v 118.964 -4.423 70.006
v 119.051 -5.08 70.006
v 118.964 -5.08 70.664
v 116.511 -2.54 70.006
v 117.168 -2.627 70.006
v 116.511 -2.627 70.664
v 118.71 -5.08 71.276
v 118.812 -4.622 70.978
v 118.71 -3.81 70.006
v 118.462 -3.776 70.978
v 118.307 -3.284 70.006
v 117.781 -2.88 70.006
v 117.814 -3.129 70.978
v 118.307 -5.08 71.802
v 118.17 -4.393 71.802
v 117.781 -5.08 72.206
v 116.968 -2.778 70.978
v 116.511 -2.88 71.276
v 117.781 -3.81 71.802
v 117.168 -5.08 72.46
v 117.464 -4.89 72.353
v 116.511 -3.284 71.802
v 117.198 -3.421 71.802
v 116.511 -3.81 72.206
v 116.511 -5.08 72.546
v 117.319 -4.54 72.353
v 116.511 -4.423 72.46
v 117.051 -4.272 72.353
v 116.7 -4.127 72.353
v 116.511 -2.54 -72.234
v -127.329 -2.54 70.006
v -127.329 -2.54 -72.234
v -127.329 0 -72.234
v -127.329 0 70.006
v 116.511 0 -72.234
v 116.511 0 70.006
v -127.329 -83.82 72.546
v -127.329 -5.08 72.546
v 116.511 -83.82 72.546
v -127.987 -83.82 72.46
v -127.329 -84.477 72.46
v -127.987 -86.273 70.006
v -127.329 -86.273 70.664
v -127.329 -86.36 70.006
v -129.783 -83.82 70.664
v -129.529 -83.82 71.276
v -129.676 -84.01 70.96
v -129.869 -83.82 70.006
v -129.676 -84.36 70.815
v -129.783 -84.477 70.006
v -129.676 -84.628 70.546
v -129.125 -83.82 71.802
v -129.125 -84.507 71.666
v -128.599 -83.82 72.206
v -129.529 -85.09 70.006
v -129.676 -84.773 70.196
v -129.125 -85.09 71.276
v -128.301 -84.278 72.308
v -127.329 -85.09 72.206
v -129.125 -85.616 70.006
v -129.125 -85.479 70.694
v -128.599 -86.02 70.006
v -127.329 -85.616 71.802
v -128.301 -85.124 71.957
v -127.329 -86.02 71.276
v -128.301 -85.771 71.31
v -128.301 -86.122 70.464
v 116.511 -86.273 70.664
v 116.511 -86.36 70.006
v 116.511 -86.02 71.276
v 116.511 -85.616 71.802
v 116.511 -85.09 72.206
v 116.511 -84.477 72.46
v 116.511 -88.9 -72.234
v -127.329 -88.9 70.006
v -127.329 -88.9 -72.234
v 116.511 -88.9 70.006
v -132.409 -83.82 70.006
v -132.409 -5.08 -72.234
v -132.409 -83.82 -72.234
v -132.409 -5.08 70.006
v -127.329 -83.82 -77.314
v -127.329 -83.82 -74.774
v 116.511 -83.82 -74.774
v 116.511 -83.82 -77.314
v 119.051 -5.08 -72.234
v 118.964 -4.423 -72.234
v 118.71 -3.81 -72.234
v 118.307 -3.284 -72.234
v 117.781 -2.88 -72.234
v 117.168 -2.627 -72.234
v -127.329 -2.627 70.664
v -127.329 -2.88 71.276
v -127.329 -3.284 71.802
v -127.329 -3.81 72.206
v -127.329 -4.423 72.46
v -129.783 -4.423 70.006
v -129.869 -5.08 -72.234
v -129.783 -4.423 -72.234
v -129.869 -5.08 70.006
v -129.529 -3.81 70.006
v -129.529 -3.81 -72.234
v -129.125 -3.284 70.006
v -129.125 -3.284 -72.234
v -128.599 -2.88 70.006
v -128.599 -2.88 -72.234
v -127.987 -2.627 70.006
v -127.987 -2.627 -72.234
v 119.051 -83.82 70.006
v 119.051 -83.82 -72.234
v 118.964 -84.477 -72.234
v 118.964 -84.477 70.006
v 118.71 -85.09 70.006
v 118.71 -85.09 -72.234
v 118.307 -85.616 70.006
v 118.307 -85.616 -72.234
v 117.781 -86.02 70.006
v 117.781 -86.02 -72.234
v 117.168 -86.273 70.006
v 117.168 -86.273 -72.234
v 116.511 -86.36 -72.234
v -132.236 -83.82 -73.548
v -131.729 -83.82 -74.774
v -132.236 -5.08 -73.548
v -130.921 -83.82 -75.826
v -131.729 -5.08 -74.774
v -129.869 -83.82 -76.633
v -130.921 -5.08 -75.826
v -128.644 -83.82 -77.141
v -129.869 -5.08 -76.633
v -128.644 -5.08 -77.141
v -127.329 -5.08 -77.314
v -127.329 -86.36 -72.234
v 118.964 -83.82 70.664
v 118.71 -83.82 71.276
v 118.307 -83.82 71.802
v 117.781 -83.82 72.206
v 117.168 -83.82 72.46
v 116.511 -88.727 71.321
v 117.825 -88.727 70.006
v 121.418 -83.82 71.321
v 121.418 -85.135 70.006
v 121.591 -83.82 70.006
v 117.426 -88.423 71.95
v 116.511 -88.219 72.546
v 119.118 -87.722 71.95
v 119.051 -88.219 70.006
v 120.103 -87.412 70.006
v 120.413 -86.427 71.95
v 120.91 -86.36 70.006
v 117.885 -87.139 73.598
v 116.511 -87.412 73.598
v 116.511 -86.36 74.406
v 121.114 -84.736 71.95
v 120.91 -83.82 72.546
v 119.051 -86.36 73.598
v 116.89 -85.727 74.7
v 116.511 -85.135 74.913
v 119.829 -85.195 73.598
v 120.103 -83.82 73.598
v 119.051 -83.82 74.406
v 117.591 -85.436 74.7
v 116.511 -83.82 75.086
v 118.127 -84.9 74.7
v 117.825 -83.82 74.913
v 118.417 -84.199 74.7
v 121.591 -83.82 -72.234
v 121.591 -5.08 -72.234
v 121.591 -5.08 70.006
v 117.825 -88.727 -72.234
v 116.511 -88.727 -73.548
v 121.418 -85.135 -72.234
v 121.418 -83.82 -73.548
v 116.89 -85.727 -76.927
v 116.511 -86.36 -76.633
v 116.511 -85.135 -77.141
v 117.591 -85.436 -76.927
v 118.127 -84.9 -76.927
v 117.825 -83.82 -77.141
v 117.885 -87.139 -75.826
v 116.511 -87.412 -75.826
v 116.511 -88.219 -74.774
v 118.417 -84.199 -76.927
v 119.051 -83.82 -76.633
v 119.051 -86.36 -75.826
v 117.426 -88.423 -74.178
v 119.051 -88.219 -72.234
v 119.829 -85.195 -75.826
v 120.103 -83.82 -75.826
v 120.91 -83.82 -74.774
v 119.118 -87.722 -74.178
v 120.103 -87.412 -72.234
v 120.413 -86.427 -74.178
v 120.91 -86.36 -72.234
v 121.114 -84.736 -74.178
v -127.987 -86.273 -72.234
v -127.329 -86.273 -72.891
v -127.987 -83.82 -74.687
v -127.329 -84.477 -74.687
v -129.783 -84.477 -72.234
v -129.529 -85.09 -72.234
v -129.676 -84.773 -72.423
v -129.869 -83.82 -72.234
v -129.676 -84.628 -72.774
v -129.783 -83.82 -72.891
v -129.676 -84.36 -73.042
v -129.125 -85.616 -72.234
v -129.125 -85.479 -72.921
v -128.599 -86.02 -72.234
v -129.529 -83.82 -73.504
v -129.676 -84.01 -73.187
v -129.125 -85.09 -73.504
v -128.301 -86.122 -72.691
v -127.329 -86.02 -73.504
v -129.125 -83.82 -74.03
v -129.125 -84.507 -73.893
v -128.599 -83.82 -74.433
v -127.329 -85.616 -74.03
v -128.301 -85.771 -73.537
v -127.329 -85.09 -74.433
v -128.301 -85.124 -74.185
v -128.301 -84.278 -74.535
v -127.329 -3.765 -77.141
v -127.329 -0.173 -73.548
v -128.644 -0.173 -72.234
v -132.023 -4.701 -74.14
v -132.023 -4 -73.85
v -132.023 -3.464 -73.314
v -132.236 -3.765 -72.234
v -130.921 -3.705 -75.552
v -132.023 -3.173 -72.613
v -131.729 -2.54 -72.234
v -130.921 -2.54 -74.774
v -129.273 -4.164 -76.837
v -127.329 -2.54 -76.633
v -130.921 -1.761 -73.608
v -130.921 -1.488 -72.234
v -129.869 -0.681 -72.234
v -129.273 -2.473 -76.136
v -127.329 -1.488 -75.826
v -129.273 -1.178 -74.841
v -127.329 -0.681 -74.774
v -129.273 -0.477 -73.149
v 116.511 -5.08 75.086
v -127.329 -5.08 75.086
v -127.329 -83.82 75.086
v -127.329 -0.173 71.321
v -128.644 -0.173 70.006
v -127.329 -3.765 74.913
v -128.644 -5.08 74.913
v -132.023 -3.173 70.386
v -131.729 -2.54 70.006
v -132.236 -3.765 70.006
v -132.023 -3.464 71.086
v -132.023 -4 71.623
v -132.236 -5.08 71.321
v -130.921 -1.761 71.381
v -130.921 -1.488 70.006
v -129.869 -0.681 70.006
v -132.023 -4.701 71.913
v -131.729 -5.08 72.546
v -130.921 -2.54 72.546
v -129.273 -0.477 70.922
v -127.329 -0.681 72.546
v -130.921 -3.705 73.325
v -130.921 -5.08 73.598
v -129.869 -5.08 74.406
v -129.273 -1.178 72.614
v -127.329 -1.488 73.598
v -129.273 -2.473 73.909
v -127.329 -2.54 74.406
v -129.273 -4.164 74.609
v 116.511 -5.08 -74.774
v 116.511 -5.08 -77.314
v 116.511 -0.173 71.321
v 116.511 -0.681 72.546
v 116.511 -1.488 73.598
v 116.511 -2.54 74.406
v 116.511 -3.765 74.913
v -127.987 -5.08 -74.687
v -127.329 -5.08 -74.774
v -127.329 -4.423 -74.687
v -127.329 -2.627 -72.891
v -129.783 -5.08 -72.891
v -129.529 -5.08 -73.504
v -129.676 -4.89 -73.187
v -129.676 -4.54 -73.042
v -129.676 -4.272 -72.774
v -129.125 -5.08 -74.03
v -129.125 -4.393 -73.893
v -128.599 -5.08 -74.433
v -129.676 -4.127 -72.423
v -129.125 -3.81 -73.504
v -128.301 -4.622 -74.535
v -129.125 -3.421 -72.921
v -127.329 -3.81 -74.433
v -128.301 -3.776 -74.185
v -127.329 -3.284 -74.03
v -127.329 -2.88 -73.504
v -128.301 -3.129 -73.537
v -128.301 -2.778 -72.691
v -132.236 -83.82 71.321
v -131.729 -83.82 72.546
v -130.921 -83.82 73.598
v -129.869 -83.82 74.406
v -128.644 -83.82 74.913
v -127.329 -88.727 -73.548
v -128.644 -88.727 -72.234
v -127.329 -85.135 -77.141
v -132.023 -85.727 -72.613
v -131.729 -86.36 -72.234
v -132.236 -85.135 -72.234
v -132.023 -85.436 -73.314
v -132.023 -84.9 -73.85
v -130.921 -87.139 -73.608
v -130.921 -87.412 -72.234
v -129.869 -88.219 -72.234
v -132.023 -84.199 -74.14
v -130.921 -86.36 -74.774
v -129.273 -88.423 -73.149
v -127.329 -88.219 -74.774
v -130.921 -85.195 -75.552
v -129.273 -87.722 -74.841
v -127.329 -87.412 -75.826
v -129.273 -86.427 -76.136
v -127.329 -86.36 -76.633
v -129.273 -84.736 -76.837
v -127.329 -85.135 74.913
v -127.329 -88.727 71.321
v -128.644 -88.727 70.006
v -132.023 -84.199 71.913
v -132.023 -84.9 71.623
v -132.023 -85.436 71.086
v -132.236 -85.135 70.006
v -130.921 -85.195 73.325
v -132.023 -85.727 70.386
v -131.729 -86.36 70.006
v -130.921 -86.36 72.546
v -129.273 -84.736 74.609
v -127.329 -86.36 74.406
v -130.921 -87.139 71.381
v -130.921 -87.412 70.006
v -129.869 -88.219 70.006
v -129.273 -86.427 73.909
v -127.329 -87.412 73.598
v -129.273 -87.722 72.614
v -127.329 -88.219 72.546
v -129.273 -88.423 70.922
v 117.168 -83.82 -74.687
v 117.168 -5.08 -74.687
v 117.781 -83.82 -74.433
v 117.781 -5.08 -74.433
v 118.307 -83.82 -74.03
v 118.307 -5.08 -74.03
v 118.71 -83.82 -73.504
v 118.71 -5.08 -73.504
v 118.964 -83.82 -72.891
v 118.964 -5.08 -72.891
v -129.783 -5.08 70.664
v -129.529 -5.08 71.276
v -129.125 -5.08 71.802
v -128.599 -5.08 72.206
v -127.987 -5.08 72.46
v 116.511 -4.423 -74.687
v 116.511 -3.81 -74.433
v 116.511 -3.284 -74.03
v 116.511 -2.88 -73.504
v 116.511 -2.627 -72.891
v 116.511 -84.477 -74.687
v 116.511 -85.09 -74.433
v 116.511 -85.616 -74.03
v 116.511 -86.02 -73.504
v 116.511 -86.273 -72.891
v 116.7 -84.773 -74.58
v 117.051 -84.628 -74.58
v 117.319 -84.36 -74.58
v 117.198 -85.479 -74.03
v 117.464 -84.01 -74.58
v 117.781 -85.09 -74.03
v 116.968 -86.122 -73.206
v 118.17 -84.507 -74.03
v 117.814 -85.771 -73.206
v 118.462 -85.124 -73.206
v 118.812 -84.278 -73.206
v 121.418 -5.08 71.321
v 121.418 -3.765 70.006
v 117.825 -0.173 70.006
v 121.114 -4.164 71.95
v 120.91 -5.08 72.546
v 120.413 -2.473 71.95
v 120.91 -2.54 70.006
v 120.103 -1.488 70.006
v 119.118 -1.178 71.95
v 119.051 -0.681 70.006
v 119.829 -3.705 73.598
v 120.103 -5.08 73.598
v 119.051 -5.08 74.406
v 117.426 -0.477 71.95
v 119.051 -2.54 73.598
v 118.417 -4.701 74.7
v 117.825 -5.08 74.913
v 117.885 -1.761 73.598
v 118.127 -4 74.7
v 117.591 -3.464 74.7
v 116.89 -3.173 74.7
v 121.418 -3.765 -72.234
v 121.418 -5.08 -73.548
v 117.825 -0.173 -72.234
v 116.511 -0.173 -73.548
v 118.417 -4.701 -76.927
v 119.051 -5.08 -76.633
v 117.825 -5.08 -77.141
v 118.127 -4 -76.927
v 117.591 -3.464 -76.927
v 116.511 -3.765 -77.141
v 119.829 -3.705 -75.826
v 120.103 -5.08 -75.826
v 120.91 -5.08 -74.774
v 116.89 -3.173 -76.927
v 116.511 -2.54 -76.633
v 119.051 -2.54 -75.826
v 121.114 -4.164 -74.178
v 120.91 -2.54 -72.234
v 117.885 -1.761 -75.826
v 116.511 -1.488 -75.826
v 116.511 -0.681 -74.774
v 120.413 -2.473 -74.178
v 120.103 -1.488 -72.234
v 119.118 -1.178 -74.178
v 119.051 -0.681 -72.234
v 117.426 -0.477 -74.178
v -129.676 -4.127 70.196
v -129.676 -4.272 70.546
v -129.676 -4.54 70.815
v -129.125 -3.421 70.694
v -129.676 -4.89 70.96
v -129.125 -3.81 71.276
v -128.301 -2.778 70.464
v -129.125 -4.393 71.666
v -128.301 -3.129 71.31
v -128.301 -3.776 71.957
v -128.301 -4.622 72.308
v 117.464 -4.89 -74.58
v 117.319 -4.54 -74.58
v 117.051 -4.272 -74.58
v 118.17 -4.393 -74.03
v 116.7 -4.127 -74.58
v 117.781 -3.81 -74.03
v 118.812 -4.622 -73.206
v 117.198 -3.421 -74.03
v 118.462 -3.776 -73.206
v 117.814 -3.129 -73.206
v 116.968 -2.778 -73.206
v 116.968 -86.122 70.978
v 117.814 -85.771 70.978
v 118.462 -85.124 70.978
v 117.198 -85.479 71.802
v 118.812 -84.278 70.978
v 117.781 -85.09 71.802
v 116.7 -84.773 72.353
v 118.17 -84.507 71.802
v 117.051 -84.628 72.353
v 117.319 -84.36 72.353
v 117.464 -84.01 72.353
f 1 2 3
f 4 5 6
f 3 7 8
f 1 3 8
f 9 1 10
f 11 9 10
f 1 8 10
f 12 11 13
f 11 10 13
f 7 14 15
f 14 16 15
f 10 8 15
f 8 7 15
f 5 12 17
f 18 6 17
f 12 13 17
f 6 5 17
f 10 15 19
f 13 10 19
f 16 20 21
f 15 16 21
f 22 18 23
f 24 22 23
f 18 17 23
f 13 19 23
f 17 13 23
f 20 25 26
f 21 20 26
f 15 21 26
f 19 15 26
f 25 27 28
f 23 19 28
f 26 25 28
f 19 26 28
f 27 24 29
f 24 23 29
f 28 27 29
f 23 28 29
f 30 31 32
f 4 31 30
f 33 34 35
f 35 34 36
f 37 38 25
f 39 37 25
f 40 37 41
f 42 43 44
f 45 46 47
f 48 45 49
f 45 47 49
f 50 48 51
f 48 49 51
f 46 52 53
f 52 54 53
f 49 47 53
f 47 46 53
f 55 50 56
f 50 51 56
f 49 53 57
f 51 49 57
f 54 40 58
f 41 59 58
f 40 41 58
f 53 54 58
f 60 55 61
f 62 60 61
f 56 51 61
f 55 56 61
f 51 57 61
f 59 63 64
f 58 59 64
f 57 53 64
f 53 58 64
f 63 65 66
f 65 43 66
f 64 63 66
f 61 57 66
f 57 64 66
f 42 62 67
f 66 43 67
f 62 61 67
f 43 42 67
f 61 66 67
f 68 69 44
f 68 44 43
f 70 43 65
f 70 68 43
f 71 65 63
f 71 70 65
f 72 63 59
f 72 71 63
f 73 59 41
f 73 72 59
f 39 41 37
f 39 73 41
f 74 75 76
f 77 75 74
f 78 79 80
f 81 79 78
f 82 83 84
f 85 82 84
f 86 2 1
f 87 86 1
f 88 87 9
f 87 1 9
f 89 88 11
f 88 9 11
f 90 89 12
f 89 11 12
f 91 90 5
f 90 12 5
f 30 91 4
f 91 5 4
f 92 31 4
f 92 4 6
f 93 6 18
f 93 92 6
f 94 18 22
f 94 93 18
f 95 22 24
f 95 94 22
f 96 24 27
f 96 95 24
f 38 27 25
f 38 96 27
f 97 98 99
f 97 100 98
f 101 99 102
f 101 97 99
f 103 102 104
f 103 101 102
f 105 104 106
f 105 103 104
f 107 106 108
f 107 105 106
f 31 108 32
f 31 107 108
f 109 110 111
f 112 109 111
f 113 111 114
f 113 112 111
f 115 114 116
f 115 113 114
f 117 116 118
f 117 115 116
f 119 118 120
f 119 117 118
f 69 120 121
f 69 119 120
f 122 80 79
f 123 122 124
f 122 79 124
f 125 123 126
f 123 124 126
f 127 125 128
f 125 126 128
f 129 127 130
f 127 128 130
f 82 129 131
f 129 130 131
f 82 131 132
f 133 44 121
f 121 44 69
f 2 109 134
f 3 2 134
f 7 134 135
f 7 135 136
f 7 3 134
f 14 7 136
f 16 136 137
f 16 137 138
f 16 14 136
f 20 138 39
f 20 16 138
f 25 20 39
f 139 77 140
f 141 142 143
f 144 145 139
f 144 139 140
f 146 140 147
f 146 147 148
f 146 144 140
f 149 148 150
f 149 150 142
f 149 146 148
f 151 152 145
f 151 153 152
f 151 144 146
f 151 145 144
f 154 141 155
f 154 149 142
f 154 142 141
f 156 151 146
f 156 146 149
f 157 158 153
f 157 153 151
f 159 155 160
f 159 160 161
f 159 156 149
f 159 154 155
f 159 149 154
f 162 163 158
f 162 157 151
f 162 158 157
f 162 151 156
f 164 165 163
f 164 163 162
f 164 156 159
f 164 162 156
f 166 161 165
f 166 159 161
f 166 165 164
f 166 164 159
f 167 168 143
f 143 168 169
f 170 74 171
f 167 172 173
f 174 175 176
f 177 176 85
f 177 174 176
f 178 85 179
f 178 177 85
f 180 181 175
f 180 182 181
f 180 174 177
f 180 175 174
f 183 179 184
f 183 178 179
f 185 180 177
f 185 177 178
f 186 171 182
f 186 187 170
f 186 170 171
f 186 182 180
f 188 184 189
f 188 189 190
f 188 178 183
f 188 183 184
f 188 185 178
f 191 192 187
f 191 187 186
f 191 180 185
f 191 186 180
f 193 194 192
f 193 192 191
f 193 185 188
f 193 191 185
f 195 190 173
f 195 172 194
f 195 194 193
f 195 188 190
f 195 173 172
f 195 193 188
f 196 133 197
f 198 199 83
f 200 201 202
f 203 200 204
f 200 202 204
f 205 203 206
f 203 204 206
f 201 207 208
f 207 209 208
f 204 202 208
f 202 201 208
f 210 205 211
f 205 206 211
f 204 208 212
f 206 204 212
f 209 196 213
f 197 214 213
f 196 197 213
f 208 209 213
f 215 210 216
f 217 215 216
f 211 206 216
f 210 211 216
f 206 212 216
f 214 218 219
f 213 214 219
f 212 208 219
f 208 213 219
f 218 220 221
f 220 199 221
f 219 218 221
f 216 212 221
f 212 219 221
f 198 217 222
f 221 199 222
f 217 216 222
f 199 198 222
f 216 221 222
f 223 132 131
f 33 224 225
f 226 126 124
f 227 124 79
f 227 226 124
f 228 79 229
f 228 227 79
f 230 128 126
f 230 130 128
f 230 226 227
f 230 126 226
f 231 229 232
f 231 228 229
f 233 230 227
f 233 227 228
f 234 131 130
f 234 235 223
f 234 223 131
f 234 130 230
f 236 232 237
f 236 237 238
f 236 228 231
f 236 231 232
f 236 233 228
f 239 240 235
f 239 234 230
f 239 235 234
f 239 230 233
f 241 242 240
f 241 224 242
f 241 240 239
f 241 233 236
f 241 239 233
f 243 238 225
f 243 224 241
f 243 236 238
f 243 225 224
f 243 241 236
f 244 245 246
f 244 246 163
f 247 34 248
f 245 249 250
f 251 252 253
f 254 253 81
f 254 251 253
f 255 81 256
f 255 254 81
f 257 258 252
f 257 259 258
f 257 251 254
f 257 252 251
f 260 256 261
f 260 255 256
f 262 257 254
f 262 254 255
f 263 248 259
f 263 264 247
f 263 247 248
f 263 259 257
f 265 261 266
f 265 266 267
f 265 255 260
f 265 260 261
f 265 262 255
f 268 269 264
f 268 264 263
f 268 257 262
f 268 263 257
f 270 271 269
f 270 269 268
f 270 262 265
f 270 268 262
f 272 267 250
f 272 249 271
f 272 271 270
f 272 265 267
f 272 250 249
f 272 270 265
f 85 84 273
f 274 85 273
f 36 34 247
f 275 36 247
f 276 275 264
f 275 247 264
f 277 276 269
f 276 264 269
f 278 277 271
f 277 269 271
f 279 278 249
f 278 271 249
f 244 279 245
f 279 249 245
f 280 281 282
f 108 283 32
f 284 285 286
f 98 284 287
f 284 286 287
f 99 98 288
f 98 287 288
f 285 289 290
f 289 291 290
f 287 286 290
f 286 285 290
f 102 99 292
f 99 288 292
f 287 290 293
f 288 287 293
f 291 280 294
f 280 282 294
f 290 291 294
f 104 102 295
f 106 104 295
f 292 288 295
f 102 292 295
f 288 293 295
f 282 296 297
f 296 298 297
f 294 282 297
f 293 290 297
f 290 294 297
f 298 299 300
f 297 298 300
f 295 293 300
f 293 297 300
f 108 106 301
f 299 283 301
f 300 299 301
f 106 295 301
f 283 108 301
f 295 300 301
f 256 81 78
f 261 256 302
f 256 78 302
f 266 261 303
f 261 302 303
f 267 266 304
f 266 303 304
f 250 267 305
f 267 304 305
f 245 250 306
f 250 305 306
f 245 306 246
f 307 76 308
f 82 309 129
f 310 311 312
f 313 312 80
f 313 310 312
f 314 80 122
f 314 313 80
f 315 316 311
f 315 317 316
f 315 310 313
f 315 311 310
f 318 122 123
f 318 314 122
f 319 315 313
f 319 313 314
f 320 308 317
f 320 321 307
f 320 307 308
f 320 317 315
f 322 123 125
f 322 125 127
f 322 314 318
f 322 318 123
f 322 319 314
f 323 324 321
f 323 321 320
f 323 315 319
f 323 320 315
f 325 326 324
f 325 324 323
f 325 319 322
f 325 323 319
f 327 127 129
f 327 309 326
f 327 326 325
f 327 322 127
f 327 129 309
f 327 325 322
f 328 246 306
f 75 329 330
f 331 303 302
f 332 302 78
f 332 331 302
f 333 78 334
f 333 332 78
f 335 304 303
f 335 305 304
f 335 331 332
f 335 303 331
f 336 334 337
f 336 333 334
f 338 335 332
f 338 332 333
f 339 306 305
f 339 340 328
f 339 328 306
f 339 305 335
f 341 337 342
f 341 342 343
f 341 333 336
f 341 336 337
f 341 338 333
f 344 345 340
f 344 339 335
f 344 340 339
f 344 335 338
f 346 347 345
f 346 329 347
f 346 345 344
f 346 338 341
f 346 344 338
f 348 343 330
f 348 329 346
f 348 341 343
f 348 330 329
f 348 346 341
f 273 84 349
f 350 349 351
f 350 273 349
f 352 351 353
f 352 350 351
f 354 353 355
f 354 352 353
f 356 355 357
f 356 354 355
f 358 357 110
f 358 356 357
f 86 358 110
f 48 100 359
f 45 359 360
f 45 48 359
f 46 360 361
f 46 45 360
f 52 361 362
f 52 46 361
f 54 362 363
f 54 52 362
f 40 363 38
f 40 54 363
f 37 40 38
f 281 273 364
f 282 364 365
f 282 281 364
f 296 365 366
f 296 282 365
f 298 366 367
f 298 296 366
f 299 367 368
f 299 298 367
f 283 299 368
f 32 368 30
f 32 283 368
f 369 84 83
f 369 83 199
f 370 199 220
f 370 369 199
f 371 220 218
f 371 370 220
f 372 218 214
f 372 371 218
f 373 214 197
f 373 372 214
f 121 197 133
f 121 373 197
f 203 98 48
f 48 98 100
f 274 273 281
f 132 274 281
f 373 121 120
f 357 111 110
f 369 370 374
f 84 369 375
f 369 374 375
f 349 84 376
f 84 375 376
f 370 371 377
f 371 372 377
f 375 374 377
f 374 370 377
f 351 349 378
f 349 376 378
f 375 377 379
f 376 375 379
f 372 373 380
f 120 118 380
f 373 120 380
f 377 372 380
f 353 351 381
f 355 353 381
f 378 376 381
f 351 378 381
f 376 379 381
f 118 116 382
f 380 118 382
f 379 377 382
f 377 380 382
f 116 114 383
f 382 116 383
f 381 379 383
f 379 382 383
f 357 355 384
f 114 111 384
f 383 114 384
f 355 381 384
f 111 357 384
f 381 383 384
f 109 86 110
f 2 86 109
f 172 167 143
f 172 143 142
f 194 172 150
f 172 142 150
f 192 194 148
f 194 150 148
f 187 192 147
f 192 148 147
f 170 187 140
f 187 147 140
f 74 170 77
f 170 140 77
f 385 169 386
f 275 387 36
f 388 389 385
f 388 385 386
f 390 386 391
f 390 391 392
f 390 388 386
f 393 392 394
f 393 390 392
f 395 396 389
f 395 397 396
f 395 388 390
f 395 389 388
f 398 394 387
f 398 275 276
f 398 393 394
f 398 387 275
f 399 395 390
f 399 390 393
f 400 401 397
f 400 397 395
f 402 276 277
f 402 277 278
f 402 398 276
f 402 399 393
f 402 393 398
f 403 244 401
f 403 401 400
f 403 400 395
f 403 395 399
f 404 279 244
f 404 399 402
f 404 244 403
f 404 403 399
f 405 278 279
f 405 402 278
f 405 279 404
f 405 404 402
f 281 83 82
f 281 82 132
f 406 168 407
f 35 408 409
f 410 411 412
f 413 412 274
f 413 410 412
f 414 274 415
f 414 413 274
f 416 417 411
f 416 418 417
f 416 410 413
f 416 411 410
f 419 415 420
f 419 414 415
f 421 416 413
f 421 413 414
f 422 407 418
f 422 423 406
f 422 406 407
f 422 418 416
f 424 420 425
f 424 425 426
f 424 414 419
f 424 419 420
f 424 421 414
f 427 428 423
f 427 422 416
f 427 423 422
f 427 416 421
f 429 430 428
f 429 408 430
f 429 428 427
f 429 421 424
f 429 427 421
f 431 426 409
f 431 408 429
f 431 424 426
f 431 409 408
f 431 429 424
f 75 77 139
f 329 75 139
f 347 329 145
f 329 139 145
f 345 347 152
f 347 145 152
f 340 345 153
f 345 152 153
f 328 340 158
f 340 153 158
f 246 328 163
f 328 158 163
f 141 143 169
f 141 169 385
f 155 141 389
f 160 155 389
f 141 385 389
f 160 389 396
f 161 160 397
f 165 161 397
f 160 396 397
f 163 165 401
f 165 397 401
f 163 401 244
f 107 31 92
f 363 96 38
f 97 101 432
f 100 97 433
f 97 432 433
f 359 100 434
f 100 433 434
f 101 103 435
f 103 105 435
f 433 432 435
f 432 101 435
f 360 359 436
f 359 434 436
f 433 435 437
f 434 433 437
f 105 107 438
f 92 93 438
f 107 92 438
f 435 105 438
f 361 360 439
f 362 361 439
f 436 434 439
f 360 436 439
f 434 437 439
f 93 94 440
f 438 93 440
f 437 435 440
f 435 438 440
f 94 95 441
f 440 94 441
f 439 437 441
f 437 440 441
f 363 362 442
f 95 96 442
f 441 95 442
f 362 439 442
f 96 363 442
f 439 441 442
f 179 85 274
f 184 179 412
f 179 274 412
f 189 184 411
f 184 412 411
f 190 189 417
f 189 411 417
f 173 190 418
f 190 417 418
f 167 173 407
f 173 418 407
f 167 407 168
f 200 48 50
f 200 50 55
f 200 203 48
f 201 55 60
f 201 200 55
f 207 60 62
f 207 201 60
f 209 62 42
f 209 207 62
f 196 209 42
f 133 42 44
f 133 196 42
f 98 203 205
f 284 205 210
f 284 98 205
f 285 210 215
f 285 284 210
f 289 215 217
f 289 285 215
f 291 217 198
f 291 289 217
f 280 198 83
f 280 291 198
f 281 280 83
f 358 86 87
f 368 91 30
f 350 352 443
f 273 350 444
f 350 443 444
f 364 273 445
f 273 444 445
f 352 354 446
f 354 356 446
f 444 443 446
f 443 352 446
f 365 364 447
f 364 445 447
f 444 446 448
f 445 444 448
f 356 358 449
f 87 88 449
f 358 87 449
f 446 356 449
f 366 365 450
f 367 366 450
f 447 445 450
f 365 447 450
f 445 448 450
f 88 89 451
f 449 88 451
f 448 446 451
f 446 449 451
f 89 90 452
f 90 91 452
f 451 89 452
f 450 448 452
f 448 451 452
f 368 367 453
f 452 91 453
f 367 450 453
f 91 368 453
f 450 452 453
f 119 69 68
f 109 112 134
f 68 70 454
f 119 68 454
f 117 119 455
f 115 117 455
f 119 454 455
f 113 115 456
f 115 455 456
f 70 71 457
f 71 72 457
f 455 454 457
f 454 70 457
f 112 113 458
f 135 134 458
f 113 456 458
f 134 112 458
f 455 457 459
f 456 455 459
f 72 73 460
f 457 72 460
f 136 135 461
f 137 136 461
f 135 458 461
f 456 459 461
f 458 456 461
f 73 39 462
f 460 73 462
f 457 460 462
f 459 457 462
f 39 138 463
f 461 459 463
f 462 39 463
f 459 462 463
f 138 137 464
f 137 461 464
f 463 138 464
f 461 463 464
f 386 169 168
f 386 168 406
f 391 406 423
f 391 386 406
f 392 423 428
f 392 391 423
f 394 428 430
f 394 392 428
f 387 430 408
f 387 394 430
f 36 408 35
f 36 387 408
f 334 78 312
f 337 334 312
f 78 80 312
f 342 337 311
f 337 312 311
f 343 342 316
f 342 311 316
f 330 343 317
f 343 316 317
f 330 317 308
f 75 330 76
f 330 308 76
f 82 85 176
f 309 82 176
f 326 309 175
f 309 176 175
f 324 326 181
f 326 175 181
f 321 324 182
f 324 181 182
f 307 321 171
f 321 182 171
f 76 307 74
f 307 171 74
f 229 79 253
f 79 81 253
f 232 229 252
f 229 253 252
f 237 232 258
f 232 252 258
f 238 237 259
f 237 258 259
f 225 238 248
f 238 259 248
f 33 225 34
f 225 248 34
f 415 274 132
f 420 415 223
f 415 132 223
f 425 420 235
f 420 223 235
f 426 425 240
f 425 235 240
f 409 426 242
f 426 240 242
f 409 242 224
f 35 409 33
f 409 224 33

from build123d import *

# Parameters (mm, degrees)
F0_W     = 254
F0_H     = 152.4
F1_DEPTH = 88.9
F2_R     = 5.08
F3_R     = 5.08
F4_R     = 5.08
F5_T     = -2.54


# Not quite as in the source:
# - a shell that OpenCascade refuses in one call is made with other operations: the cavity is built on its own and cut out


with BuildPart() as f1:
    # F0 (on Front) → F1 (new body)
    with BuildSketch(Plane.XZ):
        with Locations((-5.4093236282, -1.1136829853)):
            Rectangle(F0_W, F0_H)
    extrude(amount=F1_DEPTH)

    # F2
    f2_edges = [f1.edges().sort_by_distance(p)[0] for p in [
        (121.590676, -88.9, -1.113683),
        (121.590676, 0, -1.113683),
    ]]
    fillet(f2_edges, radius=F2_R)

    # F3
    f3_edges = [f1.edges().sort_by_distance(p)[0] for p in [
        (-7.949324, -88.9, 75.086317),
        (-7.949324, -88.9, -77.313683),
    ]]
    fillet(f3_edges, radius=F3_R)

    # F4
    f4_edges = [f1.edges().sort_by_distance(p)[0] for p in [
        (-132.409324, 0, -1.113683),
        (-132.409324, -88.9, -1.113683),
    ]]
    fillet(f4_edges, radius=F4_R)

    # F5: a shell. OpenCascade refuses it in one call, so the cavity is built on its own and cut out:
    # the body offset inwards by the wall thickness, plus a prism from it out through each open face.
    f5_core = offset(f1.part, amount=F5_T, mode=Mode.PRIVATE)
    f5_exits = [f5_core.faces().sort_by_distance(p)[0] for p in [
        (-5.409324, -44.45, -74.773683),
    ]]
    add(f5_core, mode=Mode.SUBTRACT)
    extrude(f5_exits, amount=-F5_T, mode=Mode.SUBTRACT)


solid = f1.part
